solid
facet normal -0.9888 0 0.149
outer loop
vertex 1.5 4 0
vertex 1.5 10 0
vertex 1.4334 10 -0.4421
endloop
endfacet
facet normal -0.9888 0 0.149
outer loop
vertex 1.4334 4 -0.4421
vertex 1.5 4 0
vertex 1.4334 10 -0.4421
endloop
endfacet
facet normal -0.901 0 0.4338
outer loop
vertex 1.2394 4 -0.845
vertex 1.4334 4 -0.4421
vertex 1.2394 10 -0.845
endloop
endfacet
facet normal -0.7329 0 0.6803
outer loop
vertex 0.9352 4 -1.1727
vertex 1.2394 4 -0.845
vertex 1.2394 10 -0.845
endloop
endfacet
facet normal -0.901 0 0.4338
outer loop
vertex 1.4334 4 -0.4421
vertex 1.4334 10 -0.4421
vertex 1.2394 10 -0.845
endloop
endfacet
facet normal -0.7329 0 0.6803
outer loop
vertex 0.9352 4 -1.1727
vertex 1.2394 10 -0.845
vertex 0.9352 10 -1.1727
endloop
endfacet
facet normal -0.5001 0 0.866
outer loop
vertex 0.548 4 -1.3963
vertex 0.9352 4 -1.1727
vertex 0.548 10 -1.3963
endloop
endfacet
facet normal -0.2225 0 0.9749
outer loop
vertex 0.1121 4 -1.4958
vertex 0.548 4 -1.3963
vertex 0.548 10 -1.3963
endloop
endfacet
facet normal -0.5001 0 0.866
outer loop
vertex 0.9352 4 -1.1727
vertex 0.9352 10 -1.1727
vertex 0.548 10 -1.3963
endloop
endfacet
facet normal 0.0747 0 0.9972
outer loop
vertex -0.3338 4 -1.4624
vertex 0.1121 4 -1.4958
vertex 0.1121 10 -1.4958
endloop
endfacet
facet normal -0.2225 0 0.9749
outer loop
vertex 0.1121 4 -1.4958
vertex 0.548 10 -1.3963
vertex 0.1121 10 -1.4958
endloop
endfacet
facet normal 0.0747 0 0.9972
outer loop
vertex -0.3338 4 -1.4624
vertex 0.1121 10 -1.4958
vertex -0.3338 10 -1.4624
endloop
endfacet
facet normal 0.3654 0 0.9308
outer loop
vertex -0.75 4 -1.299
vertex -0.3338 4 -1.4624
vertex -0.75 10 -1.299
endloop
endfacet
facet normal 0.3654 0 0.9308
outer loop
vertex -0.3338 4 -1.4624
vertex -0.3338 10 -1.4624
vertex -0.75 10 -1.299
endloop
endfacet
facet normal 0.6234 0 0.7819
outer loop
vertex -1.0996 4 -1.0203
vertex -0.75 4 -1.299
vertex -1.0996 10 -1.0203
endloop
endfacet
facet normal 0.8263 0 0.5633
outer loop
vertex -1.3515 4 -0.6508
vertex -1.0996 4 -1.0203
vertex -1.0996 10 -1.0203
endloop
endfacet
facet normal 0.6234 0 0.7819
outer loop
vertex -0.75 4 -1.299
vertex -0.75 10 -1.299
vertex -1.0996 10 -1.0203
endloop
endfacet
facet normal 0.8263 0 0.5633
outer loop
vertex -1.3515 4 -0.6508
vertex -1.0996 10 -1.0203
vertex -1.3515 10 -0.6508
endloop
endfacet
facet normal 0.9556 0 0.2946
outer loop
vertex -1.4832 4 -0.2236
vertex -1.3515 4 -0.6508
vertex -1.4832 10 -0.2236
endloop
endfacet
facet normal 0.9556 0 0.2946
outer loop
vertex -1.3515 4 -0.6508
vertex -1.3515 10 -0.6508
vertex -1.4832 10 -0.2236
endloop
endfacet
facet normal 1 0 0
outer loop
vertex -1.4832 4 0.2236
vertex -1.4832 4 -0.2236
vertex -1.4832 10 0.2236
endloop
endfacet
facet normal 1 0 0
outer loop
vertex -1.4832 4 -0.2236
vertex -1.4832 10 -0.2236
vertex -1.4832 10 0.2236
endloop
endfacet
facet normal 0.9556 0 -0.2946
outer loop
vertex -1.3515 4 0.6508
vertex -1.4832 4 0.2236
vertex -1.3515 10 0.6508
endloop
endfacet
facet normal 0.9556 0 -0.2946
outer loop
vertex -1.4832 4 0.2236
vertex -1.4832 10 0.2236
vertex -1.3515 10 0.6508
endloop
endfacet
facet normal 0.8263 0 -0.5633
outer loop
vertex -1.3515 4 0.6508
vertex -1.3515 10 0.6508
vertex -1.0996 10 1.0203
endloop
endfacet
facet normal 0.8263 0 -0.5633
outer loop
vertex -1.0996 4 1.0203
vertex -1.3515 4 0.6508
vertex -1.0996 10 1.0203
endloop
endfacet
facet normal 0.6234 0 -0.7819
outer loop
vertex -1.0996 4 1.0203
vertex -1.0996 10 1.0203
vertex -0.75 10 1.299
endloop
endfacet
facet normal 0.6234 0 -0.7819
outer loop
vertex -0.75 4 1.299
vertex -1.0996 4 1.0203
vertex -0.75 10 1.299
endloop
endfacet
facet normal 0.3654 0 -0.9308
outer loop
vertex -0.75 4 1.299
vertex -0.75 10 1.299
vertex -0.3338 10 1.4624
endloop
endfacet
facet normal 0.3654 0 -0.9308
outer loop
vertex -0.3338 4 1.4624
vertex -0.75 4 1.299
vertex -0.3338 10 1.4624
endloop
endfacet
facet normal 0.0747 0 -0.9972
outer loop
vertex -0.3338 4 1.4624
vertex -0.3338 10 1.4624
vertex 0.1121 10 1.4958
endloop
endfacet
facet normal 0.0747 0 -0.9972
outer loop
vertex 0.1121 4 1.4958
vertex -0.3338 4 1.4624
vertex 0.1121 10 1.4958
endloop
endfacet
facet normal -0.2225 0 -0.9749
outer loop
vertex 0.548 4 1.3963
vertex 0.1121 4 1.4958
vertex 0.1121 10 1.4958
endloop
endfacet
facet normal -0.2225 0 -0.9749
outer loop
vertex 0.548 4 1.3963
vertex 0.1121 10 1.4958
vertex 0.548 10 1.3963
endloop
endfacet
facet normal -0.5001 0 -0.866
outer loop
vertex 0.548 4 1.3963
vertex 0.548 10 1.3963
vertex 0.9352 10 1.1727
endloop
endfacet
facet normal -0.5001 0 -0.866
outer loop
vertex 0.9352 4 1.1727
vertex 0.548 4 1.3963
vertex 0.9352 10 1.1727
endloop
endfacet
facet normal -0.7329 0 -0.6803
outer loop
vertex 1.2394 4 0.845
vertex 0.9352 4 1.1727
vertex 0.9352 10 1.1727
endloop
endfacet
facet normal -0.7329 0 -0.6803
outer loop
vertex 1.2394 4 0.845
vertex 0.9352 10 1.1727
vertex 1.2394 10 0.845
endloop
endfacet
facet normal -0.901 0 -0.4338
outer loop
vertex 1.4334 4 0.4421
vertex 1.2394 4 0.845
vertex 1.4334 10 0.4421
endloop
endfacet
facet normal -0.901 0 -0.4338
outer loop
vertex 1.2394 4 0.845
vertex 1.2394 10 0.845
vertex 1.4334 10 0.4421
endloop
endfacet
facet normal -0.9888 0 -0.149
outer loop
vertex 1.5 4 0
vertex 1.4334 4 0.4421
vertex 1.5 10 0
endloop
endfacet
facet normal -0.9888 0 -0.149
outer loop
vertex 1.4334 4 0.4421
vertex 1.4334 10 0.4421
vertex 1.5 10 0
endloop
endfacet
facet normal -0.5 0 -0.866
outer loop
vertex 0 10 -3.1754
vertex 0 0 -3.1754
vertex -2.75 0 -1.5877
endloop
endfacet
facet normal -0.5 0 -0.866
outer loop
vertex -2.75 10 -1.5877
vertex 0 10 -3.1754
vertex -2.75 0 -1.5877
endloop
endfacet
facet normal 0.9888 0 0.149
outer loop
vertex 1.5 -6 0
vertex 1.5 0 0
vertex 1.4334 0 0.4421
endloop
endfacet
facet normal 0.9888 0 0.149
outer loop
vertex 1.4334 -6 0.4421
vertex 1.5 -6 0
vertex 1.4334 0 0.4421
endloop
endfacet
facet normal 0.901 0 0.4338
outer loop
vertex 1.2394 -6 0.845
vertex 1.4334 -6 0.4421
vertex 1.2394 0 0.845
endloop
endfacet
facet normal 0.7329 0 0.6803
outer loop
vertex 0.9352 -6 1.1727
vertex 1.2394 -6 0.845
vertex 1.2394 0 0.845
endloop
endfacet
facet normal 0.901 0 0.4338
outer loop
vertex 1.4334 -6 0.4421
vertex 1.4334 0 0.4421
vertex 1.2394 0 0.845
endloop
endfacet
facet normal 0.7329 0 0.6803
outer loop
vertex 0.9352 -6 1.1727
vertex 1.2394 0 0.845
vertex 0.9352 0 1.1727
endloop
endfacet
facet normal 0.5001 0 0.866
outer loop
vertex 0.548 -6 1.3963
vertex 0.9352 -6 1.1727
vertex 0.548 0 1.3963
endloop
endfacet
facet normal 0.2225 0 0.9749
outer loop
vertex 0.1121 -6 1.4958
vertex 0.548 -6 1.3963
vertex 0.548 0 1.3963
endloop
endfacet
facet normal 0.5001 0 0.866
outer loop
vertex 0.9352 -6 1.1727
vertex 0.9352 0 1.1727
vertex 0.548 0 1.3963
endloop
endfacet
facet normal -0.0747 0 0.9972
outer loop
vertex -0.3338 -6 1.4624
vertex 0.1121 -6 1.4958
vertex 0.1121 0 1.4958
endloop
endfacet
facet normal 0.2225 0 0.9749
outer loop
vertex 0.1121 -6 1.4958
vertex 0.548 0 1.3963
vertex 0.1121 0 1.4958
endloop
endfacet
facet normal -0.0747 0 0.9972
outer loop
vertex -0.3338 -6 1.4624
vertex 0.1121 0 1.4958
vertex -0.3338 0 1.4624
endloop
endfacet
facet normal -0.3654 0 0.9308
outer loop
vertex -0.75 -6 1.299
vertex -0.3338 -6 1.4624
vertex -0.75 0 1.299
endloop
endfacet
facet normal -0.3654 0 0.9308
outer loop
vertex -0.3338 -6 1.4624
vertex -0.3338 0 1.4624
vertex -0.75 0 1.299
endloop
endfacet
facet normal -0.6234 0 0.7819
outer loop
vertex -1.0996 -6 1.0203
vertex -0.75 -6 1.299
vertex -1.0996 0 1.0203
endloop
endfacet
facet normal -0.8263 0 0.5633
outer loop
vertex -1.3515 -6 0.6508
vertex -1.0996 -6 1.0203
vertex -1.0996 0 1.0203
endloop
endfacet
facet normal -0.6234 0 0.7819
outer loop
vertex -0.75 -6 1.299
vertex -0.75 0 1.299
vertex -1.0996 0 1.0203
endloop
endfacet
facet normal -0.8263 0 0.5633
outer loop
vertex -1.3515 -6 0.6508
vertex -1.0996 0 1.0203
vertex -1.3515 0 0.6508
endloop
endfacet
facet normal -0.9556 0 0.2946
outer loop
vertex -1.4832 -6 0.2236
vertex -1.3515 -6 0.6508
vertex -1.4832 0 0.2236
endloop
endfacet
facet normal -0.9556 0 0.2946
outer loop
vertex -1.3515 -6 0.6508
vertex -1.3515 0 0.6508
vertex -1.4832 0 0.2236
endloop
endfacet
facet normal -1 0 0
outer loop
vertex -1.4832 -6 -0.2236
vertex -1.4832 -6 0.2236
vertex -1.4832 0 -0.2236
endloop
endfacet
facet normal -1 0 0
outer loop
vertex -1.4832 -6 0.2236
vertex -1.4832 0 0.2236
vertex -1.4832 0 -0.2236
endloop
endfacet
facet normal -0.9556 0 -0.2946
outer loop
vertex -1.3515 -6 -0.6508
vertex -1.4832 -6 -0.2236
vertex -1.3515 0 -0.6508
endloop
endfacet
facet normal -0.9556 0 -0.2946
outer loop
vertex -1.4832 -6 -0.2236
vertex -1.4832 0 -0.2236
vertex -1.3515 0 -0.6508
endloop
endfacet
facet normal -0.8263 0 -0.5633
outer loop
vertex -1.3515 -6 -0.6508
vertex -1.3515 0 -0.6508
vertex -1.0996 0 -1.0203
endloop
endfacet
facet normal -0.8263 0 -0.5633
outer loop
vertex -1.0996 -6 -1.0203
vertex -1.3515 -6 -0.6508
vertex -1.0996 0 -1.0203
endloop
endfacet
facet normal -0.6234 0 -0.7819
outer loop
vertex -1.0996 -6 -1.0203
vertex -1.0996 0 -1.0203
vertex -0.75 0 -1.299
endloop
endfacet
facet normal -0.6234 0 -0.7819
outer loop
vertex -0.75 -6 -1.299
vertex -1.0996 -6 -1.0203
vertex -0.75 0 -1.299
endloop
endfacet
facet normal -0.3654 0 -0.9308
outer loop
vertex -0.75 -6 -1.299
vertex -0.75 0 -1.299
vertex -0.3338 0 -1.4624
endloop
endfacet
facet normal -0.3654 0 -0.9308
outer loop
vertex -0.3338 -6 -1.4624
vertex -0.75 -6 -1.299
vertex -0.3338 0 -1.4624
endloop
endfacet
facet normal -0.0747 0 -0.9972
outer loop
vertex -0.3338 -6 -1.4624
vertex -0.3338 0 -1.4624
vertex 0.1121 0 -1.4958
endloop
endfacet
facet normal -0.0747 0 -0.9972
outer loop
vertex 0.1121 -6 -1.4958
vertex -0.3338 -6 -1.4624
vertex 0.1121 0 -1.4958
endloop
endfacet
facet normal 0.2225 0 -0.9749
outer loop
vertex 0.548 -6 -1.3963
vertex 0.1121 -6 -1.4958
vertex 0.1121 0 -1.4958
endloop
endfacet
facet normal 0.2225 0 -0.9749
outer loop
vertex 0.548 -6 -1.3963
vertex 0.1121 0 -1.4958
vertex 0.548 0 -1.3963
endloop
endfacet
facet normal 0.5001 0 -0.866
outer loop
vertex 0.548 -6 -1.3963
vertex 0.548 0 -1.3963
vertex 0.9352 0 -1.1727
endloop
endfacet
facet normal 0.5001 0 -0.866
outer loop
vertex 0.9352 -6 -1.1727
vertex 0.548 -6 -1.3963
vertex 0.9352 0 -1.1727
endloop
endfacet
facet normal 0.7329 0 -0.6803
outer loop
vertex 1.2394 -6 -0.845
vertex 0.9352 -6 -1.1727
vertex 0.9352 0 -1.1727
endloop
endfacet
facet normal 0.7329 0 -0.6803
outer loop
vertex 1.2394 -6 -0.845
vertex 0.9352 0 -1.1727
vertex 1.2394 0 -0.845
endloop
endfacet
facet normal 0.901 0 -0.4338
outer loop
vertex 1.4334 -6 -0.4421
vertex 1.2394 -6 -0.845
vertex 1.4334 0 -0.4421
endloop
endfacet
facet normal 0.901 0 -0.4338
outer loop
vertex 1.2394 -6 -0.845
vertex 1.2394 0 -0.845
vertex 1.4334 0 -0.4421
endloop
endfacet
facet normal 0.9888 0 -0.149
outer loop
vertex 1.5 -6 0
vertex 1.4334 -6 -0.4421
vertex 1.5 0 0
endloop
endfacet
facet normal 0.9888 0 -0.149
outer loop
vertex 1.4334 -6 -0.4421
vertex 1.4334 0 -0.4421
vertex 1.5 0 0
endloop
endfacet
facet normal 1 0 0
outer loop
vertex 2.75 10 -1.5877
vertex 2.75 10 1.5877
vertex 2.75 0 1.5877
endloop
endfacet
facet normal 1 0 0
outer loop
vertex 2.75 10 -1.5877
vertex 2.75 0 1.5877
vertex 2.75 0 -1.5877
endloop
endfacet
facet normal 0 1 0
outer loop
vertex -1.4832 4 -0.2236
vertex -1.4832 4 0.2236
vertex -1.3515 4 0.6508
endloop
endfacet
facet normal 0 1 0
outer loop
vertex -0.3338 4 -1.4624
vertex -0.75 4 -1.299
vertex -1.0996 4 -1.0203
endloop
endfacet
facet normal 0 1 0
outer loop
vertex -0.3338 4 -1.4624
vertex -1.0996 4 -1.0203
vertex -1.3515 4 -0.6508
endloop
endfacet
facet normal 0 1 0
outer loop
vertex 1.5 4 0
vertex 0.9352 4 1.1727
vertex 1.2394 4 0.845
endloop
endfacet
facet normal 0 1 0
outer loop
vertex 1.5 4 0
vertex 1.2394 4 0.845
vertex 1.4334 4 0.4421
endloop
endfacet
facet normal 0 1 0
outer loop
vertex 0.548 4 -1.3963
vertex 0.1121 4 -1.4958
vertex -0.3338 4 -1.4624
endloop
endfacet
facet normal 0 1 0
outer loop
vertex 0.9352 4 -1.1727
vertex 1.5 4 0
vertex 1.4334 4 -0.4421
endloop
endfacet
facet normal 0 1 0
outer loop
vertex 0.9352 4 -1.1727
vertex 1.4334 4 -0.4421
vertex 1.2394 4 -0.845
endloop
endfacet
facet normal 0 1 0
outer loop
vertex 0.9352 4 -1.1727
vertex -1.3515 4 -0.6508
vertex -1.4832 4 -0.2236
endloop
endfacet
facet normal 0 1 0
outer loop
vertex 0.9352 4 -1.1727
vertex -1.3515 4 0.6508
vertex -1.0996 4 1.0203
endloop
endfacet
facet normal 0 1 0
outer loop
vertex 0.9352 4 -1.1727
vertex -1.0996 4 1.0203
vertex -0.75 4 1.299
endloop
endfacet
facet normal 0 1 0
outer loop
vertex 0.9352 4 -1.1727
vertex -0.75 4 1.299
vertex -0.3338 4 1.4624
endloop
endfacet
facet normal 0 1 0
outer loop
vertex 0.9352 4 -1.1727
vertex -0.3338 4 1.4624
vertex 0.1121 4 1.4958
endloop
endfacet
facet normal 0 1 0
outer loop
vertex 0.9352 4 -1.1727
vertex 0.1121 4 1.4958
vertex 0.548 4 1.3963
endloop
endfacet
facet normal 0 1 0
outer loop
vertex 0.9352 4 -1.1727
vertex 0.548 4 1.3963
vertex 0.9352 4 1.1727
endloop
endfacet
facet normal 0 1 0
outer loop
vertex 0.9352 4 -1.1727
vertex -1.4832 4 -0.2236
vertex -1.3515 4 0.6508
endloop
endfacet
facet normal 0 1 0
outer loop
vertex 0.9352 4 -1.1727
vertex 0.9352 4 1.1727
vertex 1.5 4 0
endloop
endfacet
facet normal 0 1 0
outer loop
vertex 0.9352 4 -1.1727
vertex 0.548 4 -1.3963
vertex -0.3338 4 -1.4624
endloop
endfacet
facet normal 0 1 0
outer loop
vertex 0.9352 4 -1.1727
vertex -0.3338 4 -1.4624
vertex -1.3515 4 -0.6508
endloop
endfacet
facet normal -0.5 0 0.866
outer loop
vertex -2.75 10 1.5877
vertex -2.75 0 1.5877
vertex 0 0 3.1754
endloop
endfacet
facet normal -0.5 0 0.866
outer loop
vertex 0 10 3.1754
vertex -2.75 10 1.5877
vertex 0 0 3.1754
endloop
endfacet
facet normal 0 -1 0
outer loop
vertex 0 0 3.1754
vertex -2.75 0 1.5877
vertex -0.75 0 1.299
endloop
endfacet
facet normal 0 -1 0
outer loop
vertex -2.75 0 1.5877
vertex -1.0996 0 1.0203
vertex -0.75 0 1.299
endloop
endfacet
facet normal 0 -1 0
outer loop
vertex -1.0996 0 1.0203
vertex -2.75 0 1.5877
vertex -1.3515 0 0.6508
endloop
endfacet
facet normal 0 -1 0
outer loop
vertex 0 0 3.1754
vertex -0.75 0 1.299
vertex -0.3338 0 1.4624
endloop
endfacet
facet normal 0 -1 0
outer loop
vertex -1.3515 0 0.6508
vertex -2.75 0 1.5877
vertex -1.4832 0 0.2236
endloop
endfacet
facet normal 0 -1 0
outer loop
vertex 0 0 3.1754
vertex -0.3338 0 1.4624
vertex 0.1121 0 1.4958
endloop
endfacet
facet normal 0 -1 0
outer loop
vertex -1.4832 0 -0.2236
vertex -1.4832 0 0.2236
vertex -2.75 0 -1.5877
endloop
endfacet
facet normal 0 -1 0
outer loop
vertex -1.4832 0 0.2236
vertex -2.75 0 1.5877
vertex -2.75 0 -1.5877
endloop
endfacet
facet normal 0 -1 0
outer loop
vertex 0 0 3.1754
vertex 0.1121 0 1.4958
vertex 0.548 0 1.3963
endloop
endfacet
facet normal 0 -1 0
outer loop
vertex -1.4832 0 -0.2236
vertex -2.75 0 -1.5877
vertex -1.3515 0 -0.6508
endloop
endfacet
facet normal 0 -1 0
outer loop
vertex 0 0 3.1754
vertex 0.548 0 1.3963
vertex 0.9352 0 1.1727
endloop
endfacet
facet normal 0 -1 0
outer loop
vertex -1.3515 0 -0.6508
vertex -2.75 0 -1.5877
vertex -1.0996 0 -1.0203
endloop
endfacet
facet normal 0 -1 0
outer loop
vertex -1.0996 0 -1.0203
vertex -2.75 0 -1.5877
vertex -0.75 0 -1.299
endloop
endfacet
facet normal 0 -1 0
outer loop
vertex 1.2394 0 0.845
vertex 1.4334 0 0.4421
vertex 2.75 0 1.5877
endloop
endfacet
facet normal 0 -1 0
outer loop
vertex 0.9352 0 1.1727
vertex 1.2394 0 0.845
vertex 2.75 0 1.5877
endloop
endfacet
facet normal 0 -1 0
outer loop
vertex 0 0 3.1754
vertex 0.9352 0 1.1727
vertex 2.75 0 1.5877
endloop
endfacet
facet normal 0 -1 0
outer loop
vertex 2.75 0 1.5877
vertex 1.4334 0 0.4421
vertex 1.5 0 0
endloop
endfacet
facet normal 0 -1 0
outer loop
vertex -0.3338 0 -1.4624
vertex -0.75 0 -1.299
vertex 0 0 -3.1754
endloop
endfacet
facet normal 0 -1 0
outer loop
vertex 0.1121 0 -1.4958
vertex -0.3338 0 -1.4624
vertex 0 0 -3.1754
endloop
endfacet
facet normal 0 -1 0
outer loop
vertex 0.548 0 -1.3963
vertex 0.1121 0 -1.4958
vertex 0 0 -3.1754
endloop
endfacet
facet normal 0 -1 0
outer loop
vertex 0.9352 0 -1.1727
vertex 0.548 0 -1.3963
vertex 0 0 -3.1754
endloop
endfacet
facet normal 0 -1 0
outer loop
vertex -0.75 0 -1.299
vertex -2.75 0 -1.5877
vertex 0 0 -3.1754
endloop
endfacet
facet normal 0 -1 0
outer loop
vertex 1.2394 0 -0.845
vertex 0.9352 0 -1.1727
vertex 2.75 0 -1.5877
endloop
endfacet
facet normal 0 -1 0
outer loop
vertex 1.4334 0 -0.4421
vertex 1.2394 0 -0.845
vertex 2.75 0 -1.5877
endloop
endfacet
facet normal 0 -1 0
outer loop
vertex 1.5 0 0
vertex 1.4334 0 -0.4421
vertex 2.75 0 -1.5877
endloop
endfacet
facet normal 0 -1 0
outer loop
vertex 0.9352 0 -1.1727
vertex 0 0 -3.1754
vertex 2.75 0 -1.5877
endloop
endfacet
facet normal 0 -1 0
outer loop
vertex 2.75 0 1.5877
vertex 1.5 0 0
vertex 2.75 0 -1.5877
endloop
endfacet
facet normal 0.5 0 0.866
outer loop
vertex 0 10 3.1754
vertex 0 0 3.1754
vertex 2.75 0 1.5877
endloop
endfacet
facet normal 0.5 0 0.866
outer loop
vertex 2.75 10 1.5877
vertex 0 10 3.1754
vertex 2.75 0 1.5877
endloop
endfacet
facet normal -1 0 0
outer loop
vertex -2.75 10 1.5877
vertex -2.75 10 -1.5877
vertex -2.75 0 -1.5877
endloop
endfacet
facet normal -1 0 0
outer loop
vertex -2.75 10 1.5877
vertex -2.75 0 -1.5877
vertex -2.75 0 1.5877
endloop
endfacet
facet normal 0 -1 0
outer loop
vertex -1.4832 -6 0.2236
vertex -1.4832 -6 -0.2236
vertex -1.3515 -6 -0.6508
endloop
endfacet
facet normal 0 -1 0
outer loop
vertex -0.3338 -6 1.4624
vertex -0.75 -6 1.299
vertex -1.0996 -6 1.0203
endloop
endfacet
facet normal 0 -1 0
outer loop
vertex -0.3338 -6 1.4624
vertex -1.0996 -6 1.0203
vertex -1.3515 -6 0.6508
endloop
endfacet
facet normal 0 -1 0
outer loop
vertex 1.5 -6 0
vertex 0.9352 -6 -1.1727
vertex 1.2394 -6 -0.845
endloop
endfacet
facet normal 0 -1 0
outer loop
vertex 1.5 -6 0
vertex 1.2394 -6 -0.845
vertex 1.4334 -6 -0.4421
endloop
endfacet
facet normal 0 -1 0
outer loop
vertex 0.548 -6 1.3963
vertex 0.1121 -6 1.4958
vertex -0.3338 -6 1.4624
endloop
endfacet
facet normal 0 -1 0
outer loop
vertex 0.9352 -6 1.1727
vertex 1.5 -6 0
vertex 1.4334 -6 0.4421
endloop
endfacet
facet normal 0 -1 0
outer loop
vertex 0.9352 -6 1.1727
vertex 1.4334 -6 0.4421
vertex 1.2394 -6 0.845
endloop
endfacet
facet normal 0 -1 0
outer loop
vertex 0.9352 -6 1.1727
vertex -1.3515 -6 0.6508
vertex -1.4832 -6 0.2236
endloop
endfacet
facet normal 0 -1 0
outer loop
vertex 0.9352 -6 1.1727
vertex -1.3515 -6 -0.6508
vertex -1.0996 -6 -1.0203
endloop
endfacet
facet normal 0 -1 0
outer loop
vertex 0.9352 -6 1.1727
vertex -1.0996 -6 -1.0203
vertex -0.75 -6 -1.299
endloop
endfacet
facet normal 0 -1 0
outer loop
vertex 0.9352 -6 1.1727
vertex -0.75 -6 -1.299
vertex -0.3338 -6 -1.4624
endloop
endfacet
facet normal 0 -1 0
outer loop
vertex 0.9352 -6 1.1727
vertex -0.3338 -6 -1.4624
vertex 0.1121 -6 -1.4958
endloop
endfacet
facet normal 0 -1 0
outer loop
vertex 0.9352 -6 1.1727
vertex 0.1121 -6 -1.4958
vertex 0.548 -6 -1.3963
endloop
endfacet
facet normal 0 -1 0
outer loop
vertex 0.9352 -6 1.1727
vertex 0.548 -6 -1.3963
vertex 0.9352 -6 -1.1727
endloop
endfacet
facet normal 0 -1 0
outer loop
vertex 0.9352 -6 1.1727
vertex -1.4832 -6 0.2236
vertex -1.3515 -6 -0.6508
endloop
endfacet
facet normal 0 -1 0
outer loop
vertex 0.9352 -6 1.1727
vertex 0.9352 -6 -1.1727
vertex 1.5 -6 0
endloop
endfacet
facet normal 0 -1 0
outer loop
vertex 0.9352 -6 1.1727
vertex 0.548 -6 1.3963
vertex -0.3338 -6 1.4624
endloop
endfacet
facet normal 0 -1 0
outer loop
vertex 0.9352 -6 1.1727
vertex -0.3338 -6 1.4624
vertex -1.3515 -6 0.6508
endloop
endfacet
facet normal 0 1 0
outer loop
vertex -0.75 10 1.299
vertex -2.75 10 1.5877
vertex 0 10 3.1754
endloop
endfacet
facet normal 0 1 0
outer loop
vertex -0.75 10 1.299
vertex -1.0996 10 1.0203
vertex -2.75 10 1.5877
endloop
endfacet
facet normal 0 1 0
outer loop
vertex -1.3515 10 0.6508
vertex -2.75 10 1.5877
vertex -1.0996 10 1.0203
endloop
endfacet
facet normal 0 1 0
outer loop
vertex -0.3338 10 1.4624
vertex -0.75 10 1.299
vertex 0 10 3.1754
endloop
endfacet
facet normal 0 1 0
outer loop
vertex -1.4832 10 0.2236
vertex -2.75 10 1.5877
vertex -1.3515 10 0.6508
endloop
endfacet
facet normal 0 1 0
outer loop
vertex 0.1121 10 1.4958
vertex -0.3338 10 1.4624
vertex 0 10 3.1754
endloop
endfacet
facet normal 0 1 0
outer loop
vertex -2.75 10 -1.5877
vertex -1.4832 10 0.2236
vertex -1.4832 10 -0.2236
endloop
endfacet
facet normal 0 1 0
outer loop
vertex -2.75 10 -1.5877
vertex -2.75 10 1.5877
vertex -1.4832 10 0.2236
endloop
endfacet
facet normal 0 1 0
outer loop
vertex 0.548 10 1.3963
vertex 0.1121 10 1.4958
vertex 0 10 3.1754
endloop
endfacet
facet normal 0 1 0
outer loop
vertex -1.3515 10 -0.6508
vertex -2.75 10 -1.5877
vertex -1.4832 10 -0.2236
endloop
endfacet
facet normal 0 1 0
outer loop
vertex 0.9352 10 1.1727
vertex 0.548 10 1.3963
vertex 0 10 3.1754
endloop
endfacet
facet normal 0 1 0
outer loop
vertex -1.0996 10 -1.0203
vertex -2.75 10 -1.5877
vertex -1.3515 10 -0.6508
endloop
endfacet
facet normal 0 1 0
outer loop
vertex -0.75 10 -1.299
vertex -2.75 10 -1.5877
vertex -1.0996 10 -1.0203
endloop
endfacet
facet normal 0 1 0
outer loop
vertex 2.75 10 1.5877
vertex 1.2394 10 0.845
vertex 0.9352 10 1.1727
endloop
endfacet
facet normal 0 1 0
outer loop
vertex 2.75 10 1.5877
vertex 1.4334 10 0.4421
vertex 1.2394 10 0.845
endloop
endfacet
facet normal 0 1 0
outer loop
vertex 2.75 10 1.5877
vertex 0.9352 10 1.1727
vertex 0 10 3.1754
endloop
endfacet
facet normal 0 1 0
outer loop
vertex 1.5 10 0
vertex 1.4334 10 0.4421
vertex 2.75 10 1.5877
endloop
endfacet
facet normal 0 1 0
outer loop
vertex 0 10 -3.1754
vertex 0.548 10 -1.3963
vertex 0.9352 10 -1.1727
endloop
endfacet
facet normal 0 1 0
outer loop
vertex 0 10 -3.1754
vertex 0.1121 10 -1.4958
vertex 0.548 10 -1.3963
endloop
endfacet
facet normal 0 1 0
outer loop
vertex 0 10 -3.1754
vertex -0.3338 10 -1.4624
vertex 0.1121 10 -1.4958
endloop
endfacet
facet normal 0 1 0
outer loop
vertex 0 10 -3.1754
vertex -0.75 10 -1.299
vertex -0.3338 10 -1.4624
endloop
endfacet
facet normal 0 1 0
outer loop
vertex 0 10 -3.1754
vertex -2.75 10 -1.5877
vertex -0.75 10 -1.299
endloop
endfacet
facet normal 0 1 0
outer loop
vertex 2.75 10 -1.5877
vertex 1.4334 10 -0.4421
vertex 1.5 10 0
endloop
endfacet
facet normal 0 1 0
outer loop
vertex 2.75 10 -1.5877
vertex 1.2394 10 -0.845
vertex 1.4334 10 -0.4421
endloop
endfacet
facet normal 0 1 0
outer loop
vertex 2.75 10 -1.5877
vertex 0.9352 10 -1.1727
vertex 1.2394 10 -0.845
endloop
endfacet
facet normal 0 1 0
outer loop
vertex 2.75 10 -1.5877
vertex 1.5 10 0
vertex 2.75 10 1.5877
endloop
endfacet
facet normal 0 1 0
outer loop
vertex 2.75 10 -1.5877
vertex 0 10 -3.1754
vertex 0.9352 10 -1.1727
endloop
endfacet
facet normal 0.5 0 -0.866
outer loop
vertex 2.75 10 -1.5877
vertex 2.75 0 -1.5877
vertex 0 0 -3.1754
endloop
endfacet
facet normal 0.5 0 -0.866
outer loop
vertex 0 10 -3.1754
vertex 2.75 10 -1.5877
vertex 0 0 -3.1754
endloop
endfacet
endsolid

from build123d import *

# Parameters (mm, degrees)
SALIENTE_EXTRUIR1_DEPTH = 10
CROQUIS2_R              = 1.5
SALIENTE_EXTRUIR2_DEPTH = 6
CROQUIS3_R              = 1.5
CORTAR_EXTRUIR1_DEPTH   = 6


with BuildPart() as part:
    # Croquis1 → Saliente-Extruir1 (new body)
    with BuildSketch(Plane(origin=(0, 0, 0), x_dir=(1, 0, 0), z_dir=(0, 1, 0))):
        Polygon((0, 3.175426481), (-2.75, 1.58771324), (-2.75, -1.58771324), (0, -3.175426481), (2.75, -1.58771324), (2.75, 1.58771324), align=None)
    extrude(amount=SALIENTE_EXTRUIR1_DEPTH)

    # Croquis2 → Saliente-Extruir2 (add)
    with BuildSketch(Plane.XZ):
        Circle(CROQUIS2_R)
    extrude(amount=SALIENTE_EXTRUIR2_DEPTH)

    # Croquis3 → Cortar-Extruir1 (cut)
    with BuildSketch(Plane(origin=(0, 10, 0), x_dir=(1, 0, 0), z_dir=(0, 1, 0))):
        Circle(CROQUIS3_R)
    extrude(amount=-CORTAR_EXTRUIR1_DEPTH, mode=Mode.SUBTRACT)


solid = part.part
